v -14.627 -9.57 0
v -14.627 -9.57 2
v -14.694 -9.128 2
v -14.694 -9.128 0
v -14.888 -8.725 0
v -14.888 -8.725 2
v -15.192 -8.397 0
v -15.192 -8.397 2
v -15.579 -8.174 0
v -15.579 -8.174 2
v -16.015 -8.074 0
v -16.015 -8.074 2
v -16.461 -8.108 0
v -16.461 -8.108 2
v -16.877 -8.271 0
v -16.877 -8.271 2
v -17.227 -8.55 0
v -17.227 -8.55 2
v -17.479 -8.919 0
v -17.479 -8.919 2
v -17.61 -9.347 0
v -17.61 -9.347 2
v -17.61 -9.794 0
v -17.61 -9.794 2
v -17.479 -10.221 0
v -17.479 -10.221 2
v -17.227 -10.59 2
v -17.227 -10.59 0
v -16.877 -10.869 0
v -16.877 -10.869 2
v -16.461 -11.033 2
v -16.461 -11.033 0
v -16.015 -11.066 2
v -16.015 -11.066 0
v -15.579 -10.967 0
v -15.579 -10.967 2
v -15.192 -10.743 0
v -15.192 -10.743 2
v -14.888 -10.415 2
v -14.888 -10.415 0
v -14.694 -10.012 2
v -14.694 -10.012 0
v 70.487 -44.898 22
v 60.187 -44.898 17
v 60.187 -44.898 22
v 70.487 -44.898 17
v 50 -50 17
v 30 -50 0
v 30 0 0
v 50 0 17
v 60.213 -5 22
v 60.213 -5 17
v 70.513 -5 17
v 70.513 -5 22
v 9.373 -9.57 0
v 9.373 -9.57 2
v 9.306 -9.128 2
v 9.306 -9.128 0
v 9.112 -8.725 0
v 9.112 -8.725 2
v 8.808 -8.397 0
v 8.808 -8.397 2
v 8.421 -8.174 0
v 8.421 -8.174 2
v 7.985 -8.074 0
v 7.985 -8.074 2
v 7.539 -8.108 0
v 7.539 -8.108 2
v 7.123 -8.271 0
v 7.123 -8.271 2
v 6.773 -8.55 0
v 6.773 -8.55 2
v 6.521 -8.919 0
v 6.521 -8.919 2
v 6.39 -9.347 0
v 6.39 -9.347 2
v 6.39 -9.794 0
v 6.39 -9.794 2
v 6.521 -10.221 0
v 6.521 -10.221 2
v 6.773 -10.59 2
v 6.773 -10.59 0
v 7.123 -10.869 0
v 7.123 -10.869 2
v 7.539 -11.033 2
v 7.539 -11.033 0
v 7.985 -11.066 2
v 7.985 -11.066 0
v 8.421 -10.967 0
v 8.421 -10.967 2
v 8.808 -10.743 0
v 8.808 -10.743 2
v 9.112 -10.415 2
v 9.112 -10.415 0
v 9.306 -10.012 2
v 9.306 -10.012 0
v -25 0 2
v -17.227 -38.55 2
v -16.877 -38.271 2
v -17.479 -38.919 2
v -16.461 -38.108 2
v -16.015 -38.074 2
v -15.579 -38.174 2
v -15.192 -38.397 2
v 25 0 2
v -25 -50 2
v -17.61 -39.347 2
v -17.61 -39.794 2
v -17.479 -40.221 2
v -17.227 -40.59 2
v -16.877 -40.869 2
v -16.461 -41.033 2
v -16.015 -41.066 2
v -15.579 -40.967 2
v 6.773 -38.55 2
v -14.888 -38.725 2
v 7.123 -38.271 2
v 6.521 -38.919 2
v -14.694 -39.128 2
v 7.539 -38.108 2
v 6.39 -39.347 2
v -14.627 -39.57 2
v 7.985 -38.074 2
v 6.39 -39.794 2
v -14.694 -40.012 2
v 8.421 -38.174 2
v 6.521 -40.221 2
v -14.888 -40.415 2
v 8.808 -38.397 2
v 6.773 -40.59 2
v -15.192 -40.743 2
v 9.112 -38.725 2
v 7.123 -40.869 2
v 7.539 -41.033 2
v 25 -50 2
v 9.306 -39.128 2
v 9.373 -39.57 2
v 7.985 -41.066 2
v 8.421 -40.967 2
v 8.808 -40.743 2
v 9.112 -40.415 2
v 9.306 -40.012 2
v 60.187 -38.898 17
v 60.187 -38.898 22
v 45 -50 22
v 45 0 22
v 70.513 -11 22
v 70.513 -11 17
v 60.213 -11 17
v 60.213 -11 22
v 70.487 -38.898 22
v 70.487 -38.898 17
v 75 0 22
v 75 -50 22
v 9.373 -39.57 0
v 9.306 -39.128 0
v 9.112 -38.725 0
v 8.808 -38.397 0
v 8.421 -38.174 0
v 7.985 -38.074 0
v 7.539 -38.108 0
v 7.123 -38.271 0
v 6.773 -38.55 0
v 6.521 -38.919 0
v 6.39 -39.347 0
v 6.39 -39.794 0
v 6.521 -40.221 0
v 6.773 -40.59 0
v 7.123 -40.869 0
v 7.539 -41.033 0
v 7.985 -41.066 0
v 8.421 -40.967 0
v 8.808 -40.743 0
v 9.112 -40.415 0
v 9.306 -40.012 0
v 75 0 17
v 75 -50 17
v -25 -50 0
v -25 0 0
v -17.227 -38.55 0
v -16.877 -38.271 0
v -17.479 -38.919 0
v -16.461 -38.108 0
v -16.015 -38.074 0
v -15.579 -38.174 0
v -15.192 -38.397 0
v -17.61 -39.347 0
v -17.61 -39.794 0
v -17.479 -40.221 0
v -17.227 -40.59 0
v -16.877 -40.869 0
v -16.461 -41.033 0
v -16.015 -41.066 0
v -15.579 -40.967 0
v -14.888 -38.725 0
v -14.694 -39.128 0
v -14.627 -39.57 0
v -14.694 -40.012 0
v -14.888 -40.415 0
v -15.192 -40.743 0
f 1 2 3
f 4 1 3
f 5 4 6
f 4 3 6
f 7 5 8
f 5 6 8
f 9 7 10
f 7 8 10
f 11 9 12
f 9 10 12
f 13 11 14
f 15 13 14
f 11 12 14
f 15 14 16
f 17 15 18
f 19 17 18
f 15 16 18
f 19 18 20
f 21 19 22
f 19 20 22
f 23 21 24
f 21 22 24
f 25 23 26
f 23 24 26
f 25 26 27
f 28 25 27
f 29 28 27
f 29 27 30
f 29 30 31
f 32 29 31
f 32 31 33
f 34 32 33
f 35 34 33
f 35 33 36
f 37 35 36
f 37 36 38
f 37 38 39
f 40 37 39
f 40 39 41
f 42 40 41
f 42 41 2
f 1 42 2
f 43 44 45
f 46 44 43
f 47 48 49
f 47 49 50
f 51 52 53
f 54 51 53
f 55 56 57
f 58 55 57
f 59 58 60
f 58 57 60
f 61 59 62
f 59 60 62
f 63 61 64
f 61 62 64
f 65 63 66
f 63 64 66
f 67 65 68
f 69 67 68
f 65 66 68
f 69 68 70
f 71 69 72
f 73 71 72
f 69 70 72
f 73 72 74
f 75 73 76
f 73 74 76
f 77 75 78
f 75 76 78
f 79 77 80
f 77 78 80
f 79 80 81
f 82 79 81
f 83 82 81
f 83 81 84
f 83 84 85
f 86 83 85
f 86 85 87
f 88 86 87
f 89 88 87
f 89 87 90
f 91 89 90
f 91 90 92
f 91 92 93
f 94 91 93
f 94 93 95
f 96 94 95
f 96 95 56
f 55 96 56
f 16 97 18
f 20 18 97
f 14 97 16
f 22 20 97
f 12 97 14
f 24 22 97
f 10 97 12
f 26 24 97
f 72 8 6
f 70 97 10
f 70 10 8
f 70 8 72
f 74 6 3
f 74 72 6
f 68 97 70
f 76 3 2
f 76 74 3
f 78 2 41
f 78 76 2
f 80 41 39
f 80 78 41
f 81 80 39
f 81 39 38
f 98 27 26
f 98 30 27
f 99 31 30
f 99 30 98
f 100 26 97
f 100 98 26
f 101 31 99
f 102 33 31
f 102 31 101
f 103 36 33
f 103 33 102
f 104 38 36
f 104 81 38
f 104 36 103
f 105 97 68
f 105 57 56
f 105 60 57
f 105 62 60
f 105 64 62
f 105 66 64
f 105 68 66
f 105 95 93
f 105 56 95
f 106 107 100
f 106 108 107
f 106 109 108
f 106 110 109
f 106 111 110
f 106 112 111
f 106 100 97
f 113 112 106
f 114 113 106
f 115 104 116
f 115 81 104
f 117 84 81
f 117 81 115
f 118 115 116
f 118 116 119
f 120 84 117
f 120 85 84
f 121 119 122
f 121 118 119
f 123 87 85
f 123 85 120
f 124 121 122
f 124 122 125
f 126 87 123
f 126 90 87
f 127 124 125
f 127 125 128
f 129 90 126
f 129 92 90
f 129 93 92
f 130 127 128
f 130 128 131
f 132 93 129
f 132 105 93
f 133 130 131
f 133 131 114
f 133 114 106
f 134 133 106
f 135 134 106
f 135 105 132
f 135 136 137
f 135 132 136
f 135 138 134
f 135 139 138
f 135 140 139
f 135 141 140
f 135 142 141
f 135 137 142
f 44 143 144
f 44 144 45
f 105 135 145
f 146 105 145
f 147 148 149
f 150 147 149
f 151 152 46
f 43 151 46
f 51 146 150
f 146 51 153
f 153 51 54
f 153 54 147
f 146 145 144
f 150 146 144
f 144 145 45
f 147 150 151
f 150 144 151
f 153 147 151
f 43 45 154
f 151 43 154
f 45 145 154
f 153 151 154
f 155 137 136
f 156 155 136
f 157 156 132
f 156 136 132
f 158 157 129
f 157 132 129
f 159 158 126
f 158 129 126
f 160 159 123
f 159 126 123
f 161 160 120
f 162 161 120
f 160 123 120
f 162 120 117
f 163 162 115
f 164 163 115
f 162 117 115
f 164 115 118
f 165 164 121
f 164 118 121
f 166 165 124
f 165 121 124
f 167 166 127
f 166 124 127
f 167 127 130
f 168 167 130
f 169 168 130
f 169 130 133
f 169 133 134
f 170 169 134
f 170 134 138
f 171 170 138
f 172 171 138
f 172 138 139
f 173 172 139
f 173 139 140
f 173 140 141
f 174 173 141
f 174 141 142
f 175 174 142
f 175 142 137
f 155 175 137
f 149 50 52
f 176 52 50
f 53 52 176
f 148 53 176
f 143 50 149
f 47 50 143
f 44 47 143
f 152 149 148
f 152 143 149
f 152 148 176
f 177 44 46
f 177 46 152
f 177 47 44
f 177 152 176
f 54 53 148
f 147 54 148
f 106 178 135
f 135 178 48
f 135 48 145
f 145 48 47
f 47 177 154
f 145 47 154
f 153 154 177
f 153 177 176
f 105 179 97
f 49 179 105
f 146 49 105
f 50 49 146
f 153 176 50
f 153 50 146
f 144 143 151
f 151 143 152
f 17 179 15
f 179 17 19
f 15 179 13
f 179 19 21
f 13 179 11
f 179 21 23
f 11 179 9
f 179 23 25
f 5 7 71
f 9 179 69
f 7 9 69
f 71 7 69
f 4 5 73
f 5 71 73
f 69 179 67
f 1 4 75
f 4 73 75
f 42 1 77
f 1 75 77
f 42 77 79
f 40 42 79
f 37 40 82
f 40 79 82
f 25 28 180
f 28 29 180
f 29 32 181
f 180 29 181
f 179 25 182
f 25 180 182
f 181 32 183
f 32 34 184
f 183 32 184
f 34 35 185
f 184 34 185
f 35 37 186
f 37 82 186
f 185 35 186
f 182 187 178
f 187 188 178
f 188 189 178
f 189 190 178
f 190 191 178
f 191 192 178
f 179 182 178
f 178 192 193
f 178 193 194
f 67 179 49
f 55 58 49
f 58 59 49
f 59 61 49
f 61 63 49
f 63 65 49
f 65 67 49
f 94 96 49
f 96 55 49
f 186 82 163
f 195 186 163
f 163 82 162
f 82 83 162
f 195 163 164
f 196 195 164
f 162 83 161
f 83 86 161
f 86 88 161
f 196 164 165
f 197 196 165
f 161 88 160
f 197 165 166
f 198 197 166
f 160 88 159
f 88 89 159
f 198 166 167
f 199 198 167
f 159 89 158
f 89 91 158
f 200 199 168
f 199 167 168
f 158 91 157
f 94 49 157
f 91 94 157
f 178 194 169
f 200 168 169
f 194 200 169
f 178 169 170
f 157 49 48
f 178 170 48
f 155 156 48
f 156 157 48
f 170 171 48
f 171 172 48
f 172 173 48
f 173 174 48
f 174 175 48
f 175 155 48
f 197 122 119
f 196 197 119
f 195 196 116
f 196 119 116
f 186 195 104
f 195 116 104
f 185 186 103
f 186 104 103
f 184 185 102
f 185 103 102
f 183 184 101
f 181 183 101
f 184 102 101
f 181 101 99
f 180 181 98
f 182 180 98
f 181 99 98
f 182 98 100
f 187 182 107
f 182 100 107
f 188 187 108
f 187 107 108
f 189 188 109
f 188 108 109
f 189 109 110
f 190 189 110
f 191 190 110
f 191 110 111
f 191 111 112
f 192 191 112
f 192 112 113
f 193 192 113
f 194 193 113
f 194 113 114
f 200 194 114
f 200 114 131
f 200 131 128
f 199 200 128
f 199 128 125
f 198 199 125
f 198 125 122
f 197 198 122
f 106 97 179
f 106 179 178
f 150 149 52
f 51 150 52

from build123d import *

# Parameters (mm, degrees)
F0_W      = 50
F0_H      = 50
F1_DEPTH  = 2
F2_W      = 25
F2_H      = 50
F3_DEPTH  = 20
F4_W      = 50
F4_H      = 5
F5_DEPTH  = 25
F7_DEPTH  = 50
F8_W      = 3.329061
F8_H      = 5
F8_W_2    = 10.3
F8_H_2    = 6
F9_DEPTH  = 50
F10_W     = 3.329061
F10_H     = 5
F11_DEPTH = 5
F13_DEPTH = 50
F14_W     = 50
F14_H     = 2
F15_DEPTH = 25
F16_R     = 1.5
F17_DEPTH = 50


with BuildPart() as f1:
    # F0 (on Top) → F1 (new body)
    with BuildSketch(Plane.XY):
        with Locations((25, -25)):
            Rectangle(F0_W, F0_H)
    extrude(amount=F1_DEPTH)

    # F2 (on face) → F3 (join)
    with BuildSketch(Plane.XY.offset(2)):
        with Locations((37.5, -25)):
            Rectangle(F2_W, F2_H)
    extrude(amount=F3_DEPTH)

    # F4 (on face) → F5 (join)
    with BuildSketch(Plane.YZ.offset(50)):
        with Locations((-25, 19.5)):
            Rectangle(F4_W, F4_H)
    extrude(amount=F5_DEPTH)

    # F6 (on face) → F7 (cut)
    with BuildSketch(Plane.XZ.offset(50)):
        Polygon((45, 22), (25, 22), (25, 2), align=None)
    extrude(amount=-F7_DEPTH, mode=Mode.SUBTRACT)

    # F8 (on face) → F9 (cut)
    with BuildSketch(Plane(origin=(0, 0, 17), x_dir=(1, 0, 0), z_dir=(0, 0, -1))):
        Polygon((70.513144, 11), (60.213144, 11), (60.213144, 5), (62.5, 5), (65.829061, 5), (70.513144, 5), align=None)
        with Locations((64.16453, 2.5)):
            Rectangle(F8_W, F8_H)
        with Locations((65.336539, 41.898386)):
            Rectangle(F8_W_2, F8_H_2)
    extrude(amount=-F9_DEPTH, mode=Mode.SUBTRACT)

    # F10 (on face) → F11 (join)
    with BuildSketch(Plane(origin=(0, 0, 17), x_dir=(1, 0, 0), z_dir=(0, 0, -1))):
        with Locations((64.16453, 2.5)):
            Rectangle(F10_W, F10_H)
    extrude(amount=-F11_DEPTH)

    # F12 (on face) → F13 (cut)
    with BuildSketch(Plane(origin=(0, 0, 0), x_dir=(-1, 0, 0), z_dir=(0, 1, 0))):
        Polygon((-30, 0), (-50, 17), (-50, 0), align=None)
    extrude(amount=-F13_DEPTH, mode=Mode.SUBTRACT)

    # F14 (on face) → F15 (join)
    with BuildSketch(Plane(origin=(0, 0, 0), x_dir=(0, -1, 0), z_dir=(-1, 0, 0))):
        with Locations((25, 1)):
            Rectangle(F14_W, F14_H)
    extrude(amount=F15_DEPTH)

    # F16 (on face) → F17 (cut)
    with BuildSketch(Plane.XY.offset(2)):
        with Locations((-16.127206, -9.57024)):
            Circle(F16_R)
        with Locations((7.872794, -9.57024)):
            Circle(F16_R)
        with Locations((7.872794, -39.57024)):
            Circle(F16_R)
        with Locations((-16.127206, -39.57024)):
            Circle(F16_R)
    extrude(amount=-F17_DEPTH, mode=Mode.SUBTRACT)


solid = f1.part
